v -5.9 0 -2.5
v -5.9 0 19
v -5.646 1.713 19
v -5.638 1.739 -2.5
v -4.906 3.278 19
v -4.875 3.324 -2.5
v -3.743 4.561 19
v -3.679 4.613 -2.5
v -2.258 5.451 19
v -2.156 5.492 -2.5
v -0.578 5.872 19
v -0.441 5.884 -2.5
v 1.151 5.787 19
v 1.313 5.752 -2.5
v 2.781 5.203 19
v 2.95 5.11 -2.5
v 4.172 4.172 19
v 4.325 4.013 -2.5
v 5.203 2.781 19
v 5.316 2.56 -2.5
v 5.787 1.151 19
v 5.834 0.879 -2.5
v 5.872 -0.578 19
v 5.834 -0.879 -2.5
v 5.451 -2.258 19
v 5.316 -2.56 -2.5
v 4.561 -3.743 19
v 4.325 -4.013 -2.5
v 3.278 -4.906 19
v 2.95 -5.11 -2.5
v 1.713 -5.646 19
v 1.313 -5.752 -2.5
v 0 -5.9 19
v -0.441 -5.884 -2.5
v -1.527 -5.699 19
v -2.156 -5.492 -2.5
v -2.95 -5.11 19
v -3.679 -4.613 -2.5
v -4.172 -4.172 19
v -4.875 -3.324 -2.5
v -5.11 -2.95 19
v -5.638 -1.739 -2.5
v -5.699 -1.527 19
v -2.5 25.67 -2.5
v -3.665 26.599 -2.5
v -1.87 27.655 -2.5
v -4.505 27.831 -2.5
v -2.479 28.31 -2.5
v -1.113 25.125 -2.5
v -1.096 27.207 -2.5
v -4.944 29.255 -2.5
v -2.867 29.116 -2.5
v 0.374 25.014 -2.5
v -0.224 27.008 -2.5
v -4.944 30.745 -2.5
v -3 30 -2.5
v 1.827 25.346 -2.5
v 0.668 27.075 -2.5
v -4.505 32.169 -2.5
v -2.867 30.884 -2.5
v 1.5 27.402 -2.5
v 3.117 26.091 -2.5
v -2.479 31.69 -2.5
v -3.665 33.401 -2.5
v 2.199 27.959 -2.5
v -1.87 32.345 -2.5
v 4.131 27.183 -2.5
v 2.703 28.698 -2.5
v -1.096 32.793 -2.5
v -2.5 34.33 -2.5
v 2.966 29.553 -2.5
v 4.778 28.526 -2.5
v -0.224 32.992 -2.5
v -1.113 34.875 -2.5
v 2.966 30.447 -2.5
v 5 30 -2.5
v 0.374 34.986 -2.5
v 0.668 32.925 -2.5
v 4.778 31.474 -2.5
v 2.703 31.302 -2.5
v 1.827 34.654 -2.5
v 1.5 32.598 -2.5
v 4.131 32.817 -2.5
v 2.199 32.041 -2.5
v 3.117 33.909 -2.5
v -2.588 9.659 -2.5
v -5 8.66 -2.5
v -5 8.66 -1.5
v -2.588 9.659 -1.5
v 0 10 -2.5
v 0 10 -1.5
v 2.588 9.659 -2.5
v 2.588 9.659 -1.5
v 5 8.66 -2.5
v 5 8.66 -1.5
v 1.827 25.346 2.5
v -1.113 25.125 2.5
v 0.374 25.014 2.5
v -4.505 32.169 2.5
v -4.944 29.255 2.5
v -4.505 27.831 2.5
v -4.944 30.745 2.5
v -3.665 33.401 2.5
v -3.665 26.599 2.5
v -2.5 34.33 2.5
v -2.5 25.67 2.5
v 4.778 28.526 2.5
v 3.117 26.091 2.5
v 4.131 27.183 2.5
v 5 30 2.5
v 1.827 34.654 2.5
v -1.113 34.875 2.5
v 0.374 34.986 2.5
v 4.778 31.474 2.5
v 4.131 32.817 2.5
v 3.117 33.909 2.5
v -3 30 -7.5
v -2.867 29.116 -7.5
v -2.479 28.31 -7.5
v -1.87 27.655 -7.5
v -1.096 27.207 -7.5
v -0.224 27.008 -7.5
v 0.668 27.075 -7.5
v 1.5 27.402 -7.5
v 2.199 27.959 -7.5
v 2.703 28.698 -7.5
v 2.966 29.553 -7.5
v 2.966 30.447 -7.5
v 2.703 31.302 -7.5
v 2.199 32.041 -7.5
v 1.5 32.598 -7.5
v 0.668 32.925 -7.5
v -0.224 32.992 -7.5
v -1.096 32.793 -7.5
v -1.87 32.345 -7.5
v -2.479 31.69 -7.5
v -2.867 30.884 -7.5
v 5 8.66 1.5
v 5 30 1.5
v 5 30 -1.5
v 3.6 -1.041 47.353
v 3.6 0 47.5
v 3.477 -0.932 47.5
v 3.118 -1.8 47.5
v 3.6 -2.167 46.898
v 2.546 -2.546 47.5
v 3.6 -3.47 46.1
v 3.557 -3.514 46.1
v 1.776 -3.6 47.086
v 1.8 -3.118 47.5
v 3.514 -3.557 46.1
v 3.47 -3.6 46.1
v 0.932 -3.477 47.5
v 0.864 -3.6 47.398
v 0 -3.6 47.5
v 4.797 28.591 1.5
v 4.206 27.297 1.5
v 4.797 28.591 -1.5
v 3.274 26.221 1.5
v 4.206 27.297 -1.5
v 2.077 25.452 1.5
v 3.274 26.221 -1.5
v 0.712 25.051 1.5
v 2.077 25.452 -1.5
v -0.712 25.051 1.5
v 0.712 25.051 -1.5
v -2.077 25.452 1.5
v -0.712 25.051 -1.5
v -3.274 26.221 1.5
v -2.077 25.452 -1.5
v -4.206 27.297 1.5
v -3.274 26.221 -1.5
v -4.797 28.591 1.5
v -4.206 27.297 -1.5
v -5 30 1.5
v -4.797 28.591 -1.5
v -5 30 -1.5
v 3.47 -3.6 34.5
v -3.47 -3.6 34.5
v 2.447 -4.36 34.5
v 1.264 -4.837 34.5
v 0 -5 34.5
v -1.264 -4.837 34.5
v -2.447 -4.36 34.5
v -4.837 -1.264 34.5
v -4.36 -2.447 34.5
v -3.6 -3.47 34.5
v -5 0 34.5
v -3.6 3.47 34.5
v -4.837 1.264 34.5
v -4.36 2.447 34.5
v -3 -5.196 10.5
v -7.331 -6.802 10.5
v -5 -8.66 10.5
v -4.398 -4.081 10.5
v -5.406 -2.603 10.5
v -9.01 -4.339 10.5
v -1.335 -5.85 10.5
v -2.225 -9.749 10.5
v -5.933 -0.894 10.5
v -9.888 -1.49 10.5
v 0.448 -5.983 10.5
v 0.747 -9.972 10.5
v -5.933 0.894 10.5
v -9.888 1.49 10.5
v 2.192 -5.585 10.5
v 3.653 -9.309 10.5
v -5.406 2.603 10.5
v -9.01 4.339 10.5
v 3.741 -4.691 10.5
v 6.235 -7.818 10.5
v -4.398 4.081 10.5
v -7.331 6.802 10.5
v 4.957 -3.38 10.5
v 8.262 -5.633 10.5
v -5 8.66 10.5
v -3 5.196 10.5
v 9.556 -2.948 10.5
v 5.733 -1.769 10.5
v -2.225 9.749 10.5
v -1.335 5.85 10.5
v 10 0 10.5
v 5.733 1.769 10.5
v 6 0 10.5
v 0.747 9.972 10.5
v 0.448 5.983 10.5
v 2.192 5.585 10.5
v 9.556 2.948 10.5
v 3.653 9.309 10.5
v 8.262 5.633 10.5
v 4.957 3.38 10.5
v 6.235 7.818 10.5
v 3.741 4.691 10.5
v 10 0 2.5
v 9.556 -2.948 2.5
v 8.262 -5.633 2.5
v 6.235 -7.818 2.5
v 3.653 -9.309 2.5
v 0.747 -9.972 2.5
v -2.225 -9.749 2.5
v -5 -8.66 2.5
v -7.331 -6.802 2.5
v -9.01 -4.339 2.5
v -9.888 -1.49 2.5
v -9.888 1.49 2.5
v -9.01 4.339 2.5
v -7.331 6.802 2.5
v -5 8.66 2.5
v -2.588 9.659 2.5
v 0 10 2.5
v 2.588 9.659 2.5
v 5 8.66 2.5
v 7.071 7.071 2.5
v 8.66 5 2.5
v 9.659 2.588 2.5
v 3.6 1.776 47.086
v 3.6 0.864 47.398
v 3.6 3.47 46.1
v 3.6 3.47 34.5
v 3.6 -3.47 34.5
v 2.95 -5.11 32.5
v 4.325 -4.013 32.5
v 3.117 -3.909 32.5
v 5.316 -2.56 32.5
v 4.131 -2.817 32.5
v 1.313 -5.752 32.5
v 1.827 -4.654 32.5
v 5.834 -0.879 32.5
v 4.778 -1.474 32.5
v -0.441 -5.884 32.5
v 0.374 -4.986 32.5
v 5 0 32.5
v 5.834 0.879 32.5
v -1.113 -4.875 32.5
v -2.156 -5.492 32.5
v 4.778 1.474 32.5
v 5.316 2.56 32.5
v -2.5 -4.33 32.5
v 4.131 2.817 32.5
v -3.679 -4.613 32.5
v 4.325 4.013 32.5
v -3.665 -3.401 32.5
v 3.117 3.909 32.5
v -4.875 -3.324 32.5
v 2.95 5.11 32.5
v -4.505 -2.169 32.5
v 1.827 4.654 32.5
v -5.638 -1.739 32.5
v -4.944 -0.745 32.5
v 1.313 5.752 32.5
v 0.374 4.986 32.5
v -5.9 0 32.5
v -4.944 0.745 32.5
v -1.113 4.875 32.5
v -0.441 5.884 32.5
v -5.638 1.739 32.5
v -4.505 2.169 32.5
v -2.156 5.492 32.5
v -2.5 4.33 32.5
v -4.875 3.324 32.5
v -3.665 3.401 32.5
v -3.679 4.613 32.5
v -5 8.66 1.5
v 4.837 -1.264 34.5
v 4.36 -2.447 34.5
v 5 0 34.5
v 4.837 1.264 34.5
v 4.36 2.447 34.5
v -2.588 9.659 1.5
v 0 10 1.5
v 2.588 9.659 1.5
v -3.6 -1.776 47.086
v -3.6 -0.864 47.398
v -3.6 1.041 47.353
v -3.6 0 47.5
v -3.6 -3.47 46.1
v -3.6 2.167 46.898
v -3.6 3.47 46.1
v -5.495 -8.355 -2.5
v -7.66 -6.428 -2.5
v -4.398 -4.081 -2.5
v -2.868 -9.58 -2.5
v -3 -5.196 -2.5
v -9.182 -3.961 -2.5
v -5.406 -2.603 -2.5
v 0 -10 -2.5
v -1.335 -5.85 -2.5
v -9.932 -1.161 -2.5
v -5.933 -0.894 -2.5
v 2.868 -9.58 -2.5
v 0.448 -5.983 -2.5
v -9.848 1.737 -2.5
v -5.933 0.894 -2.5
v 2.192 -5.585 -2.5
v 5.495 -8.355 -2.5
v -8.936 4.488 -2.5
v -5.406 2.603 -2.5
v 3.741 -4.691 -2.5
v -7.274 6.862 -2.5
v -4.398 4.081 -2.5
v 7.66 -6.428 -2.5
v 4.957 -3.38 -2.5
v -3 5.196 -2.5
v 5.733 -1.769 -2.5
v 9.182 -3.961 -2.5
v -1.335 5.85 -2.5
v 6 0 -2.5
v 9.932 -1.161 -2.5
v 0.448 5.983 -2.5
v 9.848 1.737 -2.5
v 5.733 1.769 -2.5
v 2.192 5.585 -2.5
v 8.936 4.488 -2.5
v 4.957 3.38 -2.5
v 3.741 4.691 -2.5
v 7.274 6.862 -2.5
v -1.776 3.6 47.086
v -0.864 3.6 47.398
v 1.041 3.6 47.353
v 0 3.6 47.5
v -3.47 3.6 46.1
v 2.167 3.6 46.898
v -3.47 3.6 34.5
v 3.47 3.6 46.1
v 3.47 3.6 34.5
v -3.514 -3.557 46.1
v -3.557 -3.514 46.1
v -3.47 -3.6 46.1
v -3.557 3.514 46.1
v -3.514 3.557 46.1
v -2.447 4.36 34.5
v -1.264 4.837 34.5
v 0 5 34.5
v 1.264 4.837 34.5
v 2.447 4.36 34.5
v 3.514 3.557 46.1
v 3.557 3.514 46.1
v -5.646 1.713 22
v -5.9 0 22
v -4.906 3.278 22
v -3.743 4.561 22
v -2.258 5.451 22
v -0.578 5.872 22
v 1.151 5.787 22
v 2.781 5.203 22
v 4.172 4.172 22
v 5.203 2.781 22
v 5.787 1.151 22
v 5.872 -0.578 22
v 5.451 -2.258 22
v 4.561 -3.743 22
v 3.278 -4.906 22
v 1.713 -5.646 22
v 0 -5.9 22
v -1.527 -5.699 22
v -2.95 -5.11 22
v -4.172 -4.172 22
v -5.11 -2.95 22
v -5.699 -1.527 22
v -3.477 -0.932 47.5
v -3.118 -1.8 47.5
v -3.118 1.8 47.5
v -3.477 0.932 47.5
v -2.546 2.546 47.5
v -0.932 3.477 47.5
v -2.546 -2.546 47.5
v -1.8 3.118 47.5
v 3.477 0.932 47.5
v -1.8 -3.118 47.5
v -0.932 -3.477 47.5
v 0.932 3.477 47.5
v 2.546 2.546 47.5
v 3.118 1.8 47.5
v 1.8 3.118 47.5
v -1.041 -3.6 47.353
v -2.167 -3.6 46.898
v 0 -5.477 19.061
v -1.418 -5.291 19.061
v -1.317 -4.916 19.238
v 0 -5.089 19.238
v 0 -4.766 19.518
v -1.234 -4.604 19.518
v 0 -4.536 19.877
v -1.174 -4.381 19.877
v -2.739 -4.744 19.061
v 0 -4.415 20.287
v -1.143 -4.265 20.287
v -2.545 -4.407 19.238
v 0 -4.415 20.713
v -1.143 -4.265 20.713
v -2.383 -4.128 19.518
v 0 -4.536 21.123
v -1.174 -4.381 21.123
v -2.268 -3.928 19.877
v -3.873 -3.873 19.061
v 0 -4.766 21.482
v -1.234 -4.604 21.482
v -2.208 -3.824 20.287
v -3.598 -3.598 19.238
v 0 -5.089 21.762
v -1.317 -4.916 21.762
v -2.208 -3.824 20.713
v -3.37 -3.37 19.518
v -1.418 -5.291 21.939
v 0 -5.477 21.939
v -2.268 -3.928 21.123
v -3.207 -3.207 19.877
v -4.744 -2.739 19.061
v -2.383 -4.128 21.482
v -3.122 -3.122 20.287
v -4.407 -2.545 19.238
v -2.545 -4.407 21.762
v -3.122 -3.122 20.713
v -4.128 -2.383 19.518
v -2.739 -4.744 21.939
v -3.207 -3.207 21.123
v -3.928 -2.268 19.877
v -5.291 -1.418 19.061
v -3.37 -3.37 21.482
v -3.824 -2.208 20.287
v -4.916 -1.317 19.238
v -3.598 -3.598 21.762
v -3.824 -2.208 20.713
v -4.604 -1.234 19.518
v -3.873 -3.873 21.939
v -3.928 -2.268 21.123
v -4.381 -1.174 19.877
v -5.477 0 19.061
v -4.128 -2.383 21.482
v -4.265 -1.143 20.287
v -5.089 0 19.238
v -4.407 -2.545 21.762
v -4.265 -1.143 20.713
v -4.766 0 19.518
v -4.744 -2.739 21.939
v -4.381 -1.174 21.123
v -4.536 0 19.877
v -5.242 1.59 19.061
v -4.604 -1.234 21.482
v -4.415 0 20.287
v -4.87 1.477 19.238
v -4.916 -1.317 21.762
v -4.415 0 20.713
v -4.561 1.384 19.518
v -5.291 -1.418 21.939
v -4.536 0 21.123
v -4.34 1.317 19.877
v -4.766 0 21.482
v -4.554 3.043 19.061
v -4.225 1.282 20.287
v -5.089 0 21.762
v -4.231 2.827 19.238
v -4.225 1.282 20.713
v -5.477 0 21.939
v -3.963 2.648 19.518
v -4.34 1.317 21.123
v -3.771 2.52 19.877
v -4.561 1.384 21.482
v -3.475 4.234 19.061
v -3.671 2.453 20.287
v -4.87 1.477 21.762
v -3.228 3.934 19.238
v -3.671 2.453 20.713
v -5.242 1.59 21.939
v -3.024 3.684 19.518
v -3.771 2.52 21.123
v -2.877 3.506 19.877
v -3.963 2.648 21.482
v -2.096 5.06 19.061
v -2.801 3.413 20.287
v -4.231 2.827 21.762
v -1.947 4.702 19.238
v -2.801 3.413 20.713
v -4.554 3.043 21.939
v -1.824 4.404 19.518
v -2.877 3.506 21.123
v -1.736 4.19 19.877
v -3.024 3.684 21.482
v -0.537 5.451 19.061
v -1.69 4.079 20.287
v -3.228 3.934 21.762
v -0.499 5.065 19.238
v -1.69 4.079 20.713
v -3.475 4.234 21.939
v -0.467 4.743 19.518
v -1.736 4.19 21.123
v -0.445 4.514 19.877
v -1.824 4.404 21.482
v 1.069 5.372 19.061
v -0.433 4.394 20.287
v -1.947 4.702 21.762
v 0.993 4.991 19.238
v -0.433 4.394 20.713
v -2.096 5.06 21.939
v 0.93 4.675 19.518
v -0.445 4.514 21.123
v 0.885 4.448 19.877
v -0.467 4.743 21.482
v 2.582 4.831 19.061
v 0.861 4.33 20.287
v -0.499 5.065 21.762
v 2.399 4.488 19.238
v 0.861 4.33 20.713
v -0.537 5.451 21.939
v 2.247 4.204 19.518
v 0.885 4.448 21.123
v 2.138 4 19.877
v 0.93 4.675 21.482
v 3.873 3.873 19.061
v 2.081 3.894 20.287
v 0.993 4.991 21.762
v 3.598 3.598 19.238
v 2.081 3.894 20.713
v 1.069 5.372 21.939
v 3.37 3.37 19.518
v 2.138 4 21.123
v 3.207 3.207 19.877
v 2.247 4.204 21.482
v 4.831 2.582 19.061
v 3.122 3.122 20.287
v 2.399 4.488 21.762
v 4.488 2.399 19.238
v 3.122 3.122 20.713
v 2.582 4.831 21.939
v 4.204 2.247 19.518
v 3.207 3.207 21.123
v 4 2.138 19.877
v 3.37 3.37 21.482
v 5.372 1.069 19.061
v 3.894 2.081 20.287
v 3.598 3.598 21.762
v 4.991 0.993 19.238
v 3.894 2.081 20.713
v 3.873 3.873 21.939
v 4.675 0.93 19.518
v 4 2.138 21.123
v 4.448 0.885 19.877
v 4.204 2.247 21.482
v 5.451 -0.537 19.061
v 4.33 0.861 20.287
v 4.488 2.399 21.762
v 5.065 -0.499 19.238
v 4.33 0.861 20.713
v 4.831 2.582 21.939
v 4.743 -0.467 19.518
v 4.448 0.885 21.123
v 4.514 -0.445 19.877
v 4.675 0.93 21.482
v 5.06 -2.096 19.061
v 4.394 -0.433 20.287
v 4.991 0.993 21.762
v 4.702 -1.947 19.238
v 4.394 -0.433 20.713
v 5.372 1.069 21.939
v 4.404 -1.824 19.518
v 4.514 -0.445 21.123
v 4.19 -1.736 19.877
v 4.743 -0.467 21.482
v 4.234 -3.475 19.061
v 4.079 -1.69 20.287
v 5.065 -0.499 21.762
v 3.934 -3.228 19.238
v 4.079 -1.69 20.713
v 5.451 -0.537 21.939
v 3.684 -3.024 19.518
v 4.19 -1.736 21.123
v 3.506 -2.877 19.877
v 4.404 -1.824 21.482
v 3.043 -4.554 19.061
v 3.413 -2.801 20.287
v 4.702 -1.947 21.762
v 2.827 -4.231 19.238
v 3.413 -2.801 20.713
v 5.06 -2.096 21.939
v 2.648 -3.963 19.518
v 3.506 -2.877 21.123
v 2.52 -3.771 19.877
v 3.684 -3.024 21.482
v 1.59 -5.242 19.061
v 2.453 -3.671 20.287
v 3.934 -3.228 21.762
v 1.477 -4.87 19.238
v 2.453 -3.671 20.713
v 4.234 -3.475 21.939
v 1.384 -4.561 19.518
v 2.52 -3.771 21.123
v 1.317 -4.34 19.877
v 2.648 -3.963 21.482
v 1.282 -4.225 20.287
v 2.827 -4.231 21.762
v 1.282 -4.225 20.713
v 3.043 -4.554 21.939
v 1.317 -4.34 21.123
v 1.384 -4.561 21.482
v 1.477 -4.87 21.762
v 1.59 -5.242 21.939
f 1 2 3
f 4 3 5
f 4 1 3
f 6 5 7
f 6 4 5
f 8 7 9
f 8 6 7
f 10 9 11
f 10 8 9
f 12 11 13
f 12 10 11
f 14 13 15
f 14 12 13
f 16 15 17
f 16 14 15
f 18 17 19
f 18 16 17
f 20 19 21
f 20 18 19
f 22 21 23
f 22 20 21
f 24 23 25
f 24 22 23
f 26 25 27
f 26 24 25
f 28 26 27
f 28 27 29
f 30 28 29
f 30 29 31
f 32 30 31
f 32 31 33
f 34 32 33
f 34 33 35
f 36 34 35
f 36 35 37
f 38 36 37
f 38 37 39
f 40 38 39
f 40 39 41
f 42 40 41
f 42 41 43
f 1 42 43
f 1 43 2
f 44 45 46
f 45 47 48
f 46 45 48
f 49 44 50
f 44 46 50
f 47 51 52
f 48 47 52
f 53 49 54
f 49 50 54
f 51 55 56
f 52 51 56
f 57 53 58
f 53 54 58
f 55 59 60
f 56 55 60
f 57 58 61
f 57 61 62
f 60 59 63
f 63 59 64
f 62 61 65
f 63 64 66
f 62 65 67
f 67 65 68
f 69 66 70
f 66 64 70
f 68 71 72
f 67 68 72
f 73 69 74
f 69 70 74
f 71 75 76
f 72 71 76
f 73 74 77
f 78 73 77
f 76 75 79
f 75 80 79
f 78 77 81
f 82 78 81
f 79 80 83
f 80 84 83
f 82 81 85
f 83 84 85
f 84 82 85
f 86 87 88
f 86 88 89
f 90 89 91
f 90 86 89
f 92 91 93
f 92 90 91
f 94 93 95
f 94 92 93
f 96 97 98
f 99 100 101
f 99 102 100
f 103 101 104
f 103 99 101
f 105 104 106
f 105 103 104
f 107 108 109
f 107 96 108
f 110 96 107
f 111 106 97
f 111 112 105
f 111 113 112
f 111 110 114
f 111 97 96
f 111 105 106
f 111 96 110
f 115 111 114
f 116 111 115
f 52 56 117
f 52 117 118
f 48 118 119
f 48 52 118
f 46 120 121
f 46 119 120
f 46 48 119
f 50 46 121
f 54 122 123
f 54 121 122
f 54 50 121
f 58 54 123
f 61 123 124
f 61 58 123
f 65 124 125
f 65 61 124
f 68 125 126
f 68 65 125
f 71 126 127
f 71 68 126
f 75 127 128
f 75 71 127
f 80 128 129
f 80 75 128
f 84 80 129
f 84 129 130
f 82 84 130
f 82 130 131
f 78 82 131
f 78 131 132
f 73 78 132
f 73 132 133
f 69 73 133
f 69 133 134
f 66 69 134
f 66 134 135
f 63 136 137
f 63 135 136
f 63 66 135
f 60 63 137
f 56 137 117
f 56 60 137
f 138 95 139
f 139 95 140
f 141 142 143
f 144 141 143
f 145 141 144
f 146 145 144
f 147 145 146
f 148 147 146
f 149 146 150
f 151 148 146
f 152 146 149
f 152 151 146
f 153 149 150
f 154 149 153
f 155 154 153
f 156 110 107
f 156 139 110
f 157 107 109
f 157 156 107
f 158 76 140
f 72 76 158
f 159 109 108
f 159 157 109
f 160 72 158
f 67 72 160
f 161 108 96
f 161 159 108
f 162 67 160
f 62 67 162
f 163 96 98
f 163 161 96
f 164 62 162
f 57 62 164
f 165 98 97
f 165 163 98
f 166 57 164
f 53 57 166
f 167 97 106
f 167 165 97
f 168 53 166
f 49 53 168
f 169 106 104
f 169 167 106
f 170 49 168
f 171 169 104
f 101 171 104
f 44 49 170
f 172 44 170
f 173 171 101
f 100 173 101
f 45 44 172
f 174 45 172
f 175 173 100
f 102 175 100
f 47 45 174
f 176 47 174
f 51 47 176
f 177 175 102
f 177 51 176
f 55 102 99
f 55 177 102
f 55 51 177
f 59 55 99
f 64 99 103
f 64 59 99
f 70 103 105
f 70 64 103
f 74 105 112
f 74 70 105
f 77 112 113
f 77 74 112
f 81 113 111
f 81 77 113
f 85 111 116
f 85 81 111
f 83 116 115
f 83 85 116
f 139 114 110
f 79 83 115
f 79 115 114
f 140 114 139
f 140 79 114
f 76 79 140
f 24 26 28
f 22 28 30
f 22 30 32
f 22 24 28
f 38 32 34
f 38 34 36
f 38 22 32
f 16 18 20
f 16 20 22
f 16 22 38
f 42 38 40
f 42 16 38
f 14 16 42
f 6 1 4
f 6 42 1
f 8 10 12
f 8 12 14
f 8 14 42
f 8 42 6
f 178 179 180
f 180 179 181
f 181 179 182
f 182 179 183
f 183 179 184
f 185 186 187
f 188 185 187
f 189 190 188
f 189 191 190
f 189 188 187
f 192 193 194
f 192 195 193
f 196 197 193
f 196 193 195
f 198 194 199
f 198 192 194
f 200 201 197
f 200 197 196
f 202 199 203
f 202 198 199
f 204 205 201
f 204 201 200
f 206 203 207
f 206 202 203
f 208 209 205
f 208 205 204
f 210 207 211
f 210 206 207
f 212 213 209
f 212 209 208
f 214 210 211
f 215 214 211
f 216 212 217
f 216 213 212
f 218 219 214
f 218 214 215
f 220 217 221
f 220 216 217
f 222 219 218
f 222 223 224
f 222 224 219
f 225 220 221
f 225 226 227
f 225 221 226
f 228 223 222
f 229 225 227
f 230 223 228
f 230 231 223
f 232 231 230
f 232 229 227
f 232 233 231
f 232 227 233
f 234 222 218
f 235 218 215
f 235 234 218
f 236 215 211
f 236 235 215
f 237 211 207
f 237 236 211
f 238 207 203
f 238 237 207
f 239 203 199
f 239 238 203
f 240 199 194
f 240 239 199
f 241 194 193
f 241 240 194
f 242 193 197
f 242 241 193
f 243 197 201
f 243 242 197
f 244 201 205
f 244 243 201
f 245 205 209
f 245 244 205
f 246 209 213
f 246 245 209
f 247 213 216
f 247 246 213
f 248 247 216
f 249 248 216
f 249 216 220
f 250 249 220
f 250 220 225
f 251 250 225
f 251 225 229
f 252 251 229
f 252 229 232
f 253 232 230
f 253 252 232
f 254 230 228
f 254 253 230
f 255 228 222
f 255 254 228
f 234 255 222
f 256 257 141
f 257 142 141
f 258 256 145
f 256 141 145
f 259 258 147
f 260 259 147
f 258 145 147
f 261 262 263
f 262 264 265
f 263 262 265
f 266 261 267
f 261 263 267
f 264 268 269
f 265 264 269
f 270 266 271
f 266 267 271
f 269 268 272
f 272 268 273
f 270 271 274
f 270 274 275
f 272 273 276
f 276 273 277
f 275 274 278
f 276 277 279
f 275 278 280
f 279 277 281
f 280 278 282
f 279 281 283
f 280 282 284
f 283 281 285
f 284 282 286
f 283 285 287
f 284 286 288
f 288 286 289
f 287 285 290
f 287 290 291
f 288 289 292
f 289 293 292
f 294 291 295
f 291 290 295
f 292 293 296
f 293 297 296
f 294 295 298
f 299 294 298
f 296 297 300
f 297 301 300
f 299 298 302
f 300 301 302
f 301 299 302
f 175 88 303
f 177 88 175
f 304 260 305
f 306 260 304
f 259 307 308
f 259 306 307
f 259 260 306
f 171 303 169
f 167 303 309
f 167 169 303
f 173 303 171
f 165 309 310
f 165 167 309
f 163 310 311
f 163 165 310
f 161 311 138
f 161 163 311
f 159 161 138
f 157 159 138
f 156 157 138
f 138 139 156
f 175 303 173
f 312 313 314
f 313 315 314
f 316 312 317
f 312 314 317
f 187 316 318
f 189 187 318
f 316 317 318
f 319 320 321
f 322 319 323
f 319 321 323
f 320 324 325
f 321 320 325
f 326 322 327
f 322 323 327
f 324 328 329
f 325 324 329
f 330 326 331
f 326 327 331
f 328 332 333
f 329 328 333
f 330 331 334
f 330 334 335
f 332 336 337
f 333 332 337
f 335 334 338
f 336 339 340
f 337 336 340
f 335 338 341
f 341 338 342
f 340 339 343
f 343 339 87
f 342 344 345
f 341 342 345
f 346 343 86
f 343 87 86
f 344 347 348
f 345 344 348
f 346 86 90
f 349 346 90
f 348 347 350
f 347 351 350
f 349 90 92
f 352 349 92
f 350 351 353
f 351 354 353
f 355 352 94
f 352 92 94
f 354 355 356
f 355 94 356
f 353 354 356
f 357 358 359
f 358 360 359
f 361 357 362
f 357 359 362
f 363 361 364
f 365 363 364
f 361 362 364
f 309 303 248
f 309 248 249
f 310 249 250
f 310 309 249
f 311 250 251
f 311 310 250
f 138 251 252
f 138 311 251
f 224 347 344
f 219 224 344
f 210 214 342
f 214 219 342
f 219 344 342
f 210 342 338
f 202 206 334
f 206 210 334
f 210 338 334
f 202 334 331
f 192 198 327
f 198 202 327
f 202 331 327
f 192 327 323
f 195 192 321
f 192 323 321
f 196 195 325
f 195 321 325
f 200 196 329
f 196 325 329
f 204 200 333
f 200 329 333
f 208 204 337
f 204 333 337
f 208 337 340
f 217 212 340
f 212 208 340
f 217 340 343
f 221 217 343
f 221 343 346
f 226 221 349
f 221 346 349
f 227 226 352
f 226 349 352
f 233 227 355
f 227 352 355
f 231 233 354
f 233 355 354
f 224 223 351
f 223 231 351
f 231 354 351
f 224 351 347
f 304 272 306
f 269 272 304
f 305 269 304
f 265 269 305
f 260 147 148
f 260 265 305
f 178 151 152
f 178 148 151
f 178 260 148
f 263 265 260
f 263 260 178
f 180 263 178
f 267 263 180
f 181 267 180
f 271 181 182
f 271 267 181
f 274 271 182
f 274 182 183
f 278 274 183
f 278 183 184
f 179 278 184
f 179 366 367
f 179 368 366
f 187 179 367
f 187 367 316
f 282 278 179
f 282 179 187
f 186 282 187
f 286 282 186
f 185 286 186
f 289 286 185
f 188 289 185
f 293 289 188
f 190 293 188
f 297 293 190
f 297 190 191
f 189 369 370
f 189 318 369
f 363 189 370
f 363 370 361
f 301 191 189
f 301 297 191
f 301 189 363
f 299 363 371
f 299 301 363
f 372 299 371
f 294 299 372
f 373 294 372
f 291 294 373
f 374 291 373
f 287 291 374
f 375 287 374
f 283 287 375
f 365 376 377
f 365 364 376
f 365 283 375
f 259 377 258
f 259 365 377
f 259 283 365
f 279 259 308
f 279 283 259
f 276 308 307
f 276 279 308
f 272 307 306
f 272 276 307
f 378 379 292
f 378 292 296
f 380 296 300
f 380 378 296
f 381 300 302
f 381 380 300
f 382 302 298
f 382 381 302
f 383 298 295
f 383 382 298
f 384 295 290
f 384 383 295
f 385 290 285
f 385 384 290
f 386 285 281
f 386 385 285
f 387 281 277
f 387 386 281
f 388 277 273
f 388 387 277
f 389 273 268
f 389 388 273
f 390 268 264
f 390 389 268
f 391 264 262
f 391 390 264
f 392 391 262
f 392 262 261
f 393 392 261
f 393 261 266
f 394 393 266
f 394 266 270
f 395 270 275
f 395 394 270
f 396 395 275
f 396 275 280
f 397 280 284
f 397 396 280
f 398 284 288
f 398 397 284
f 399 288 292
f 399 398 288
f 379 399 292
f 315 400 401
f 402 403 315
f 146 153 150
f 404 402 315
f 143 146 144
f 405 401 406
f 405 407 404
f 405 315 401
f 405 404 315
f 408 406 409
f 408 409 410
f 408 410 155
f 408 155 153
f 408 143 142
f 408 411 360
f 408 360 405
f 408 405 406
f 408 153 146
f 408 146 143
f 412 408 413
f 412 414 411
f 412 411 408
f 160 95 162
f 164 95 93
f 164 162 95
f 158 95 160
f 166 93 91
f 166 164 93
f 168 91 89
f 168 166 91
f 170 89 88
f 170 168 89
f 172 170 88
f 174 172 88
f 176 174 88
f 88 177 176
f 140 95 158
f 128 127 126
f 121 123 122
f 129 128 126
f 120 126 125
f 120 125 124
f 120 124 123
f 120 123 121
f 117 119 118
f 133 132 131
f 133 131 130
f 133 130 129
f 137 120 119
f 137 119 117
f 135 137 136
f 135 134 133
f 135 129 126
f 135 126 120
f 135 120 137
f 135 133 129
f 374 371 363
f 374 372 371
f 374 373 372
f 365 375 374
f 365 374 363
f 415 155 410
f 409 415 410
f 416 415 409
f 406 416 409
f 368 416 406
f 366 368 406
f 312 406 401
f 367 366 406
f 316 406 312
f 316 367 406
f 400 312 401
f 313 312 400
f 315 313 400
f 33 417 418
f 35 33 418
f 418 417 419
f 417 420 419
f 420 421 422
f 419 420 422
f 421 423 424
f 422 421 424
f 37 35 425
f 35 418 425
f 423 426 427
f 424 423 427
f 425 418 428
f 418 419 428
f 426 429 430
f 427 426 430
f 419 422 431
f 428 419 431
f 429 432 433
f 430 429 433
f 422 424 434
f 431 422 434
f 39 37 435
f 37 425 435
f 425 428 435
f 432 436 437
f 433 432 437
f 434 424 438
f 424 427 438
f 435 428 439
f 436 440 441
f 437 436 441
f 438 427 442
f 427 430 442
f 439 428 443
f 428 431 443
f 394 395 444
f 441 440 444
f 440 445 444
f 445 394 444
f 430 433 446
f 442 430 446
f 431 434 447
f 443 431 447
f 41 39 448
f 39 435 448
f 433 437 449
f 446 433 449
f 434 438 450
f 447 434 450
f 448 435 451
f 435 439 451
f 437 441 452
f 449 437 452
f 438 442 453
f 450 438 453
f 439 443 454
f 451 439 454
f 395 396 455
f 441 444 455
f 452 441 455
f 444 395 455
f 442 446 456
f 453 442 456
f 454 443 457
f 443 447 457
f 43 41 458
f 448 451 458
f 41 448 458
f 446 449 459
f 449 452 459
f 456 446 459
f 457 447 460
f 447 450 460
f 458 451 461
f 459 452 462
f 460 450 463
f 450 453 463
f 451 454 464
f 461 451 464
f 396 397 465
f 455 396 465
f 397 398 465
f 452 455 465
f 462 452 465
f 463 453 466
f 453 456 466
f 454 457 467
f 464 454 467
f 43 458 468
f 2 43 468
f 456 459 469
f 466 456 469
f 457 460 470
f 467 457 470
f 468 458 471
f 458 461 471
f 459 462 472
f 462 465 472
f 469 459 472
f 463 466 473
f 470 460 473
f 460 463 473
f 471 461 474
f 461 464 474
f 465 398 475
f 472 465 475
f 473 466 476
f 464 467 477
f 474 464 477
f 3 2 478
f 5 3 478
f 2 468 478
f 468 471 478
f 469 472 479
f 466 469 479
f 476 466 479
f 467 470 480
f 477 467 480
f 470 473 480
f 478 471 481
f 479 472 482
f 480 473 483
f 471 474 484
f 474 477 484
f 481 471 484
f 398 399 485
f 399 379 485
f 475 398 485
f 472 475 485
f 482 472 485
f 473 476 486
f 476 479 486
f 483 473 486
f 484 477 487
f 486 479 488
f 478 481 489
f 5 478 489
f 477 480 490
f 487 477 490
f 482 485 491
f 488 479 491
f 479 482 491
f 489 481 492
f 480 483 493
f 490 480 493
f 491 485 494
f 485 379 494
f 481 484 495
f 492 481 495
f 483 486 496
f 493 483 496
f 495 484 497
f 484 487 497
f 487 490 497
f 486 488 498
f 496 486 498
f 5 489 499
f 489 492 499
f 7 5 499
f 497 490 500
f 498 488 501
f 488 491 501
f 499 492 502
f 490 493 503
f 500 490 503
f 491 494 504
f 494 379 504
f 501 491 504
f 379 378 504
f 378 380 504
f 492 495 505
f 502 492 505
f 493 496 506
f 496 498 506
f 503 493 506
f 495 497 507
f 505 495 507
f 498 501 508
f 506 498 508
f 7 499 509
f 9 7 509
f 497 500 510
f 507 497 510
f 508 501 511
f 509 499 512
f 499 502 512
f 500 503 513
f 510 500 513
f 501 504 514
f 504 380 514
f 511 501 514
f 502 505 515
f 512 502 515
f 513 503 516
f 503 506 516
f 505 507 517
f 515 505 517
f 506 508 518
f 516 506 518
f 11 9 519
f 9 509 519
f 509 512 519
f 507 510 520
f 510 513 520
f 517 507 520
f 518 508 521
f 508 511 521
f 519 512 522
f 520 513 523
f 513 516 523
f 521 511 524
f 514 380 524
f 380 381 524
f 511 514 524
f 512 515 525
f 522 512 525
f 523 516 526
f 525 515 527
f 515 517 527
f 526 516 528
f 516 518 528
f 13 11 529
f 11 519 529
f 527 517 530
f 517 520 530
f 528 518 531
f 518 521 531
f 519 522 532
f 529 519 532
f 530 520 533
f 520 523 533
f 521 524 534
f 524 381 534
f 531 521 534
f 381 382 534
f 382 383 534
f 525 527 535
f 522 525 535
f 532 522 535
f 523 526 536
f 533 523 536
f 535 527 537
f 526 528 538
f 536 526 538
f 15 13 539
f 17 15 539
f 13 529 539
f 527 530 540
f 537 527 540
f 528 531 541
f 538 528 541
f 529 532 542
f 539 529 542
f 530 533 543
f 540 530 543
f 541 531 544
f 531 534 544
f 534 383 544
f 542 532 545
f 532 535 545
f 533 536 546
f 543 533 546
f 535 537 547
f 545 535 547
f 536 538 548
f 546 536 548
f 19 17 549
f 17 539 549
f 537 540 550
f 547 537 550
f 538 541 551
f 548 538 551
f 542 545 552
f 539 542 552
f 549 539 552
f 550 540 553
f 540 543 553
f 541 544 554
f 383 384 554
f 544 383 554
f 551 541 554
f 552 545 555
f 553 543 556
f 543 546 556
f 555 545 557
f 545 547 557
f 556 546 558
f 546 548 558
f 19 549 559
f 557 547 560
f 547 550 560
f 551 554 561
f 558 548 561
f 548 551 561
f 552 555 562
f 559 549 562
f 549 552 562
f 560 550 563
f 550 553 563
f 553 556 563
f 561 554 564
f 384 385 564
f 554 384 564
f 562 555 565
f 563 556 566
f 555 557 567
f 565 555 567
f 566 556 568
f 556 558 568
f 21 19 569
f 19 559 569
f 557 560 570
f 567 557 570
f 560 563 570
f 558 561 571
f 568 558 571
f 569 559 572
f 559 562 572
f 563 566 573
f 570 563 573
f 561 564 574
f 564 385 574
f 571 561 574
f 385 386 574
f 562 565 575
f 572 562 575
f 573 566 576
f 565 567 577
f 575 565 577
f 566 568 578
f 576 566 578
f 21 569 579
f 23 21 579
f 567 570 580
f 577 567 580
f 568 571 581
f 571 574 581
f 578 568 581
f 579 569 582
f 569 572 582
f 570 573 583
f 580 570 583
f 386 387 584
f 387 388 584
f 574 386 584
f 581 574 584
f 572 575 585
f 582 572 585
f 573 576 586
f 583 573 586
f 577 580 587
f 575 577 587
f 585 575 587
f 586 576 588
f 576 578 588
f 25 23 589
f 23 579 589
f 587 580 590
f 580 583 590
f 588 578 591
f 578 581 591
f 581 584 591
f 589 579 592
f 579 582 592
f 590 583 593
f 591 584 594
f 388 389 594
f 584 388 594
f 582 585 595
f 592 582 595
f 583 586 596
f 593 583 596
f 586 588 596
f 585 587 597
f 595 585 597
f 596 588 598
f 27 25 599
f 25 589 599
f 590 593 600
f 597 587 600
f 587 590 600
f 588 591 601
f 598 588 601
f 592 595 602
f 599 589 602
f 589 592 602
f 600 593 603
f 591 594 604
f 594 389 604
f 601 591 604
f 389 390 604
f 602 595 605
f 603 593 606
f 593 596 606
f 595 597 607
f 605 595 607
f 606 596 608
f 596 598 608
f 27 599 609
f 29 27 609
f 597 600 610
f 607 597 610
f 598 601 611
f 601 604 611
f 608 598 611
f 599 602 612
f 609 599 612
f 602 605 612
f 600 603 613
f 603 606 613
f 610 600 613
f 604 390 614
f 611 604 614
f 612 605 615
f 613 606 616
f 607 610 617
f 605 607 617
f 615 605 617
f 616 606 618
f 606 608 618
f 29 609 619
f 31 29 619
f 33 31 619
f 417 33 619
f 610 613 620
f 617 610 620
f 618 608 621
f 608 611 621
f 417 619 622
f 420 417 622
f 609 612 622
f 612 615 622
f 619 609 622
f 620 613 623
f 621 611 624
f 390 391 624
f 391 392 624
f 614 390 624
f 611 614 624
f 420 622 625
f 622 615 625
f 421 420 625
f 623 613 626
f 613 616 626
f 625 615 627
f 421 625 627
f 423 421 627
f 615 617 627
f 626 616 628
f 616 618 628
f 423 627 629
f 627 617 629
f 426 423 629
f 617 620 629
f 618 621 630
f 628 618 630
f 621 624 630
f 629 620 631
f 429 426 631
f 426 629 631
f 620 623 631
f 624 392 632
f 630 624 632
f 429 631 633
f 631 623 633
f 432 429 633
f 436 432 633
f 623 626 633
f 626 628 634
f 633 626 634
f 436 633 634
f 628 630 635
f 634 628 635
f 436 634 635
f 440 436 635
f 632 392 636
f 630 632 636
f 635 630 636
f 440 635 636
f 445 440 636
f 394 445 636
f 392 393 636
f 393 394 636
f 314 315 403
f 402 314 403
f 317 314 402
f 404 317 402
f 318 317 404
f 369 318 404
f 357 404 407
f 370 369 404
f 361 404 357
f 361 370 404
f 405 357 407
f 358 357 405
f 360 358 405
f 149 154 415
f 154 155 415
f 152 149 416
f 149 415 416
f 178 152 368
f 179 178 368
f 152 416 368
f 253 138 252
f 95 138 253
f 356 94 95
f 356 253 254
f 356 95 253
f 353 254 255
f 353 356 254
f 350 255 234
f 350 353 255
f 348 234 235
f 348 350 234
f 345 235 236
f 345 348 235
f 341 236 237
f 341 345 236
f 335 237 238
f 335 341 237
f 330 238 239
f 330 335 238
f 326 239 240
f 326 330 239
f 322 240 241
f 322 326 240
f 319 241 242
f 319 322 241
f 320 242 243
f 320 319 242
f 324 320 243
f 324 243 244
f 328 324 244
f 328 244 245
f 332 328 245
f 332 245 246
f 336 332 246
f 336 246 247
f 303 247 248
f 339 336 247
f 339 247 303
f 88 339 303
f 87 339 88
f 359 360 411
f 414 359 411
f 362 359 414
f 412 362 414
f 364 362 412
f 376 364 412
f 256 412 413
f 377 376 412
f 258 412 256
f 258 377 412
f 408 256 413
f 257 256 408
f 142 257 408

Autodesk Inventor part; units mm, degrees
ref_plane "YZ Plane" through (0, 0, 0) normal (1, 0, 0) x (0, 1, 0)
ref_plane "XZ Plane" through (0, 0, 0) normal (0, 1, 0) x (-1, 0, 0)
ref_plane "XY Plane" through (0, 0, 0) normal (0, 0, 1) x (1, 0, 0)
sketch "Sketch1" plane through (0, 0, 0) normal (0, 0, 1) x (1, 0, 0)
  circle A0 centre (0, 0) radius 6
  arc A1 (-5, 8.6603) -> (5, 8.6603) centre (0, 0) ccw
  line L0 (0, 0) -> (0, 30) construction
  circle A2 centre (0, 30) radius 3 construction
  arc A3 (5, 30) -> (-5, 30) centre (0, 30) ccw
  line L1 (-5, 8.6603) -> (-5, 30)
  line L2 (5, 8.6603) -> (5, 30)
  dimension "d0" = 30
  dimension "d1" = 6
  dimension "d2" = 10
  dimension "d3" = 12
  dimension "d4" = 20
extrude "Extrusion1" add sketch "Sketch1" along normal mid plane 5
sketch "Sketch2" plane through (0, 0, -2.5) normal (0, 0, -1) x (-1, 0, 0)
  arc A0 (-5, 8.6603) -> (5, 8.6603) centre (0, 0) ccw projected
  line L0 (5, 30) -> (5, 8.6603) projected
  arc A1 (5, 30) -> (-5, 30) centre (0, 30) ccw projected
  line L1 (-5, 8.6603) -> (-5, 30) projected
  circle A2 centre (0, 0) radius 10
  circle A3 centre (0, 30) radius 5
extrude "Extrusion2" cut sketch "Sketch2" against normal blind 1 contours L1 A3 L0 A2
mirror "Mirror1" about plane through (0, 0, 0) normal (0, 0, 1) of "Extrusion2"
sketch "Sketch3" plane through (0, 0, 2.5) normal (0, 0, 1) x (1, 0, 0)
  circle A0 centre (0, 0) radius 6 projected
  circle A1 centre (0, 0) radius 10 projected
extrude "Extrusion3" add sketch "Sketch3" along normal blind 3
sketch "Sketch4" plane through (0, 0, -2.5) normal (0, 0, -1) x (-1, 0, 0)
  circle A0 centre (0, 0) radius 6 projected
  circle A1 centre (0, 0) radius 5.9
  dimension "d12" = 0.1
extrude "Extrusion4" add sketch "Sketch4" against normal blind 35 contours A1
sketch "Sketch5" plane through (0, 30, -2.5) normal (0, 0, -1) x (-1, 0, 0)
  circle A0 centre (0, 0) radius 5 projected
  circle A1 centre (0, 0) radius 3
  dimension "d15" = 6
extrude "Extrusion5" add sketch "Sketch5" along normal blind 5 contours A1
sketch "Sketch6" plane through (0, 0, 32.5) normal (0, 0, 1) x (1, 0, 0)
  circle A0 centre (0, 0) radius 5.9 projected
  circle A1 centre (0, 0) radius 5
  dimension "d18" = 10
extrude "Extrusion6" add sketch "Sketch6" along normal blind 15 contours A1
chamfer "Chamfer1" distance 1.4 angle 45 1 edges at (-5, 0, 47.5)
sketch "Sketch7" plane through (0, 0, 47.5) normal (0, 0, 1) x (1, 0, 0)
  circle A0 centre (0, 0) radius 3.6 projected
  line L0 (3.6, 3.6) -> (3.6, -3.6)
  line L1 (3.6, -3.6) -> (-3.6, -3.6)
  line L2 (-3.6, -3.6) -> (-3.6, 3.6)
  line L3 (-3.6, 3.6) -> (3.6, 3.6)
  circle A1 centre (0, 0) radius 7.459
  point P0 (0, 3.6)
extrude "Extrusion7" cut sketch "Sketch7" against normal blind 13
sketch "Sketch8" plane through (0, 0, 0) normal (0, 1, 0) x (-1, 0, 0)
  point P0 (0, 0)
sketch "Sketch9" plane through (0, 0, 0) normal (1, 0, 0) x (0, 1, 0)
  line L0 (-5.9, 32.5) -> (5.9, 32.5) projected
  line L1 (-5.9, -2.5) -> (-5.9, 32.5) projected
  line L2 (5.9, -2.5) -> (5.9, 32.5) projected
  line L3 (-5, 32.5) -> (5, 32.5) projected
  line L4 (0, 32.5) -> (0, 20.5) construction
  line L5 (0, 20.5) -> (-5.9, 20.5) construction
  circle A0 centre (-5.9, 20.5) radius 1.5
  point P0 (0, 0)
  dimension "d26" = 3
  dimension "d27" = 12
revolve "Revolution1" cut sketch "Sketch9" angle 360 about axis through (0, 0, 32.5) along (0, 0, -1)
sketch "Sketch10" plane through (0, 0, 5.5) normal (0, 0, 1) x (1, 0, 0)
  circle A0 centre (0, 0) radius 6 projected
  circle A1 centre (0, 0) radius 10 projected
extrude "Extrusion8" add sketch "Sketch10" along normal blind 5
properties part number "Crank" material "Acero, carbono"
